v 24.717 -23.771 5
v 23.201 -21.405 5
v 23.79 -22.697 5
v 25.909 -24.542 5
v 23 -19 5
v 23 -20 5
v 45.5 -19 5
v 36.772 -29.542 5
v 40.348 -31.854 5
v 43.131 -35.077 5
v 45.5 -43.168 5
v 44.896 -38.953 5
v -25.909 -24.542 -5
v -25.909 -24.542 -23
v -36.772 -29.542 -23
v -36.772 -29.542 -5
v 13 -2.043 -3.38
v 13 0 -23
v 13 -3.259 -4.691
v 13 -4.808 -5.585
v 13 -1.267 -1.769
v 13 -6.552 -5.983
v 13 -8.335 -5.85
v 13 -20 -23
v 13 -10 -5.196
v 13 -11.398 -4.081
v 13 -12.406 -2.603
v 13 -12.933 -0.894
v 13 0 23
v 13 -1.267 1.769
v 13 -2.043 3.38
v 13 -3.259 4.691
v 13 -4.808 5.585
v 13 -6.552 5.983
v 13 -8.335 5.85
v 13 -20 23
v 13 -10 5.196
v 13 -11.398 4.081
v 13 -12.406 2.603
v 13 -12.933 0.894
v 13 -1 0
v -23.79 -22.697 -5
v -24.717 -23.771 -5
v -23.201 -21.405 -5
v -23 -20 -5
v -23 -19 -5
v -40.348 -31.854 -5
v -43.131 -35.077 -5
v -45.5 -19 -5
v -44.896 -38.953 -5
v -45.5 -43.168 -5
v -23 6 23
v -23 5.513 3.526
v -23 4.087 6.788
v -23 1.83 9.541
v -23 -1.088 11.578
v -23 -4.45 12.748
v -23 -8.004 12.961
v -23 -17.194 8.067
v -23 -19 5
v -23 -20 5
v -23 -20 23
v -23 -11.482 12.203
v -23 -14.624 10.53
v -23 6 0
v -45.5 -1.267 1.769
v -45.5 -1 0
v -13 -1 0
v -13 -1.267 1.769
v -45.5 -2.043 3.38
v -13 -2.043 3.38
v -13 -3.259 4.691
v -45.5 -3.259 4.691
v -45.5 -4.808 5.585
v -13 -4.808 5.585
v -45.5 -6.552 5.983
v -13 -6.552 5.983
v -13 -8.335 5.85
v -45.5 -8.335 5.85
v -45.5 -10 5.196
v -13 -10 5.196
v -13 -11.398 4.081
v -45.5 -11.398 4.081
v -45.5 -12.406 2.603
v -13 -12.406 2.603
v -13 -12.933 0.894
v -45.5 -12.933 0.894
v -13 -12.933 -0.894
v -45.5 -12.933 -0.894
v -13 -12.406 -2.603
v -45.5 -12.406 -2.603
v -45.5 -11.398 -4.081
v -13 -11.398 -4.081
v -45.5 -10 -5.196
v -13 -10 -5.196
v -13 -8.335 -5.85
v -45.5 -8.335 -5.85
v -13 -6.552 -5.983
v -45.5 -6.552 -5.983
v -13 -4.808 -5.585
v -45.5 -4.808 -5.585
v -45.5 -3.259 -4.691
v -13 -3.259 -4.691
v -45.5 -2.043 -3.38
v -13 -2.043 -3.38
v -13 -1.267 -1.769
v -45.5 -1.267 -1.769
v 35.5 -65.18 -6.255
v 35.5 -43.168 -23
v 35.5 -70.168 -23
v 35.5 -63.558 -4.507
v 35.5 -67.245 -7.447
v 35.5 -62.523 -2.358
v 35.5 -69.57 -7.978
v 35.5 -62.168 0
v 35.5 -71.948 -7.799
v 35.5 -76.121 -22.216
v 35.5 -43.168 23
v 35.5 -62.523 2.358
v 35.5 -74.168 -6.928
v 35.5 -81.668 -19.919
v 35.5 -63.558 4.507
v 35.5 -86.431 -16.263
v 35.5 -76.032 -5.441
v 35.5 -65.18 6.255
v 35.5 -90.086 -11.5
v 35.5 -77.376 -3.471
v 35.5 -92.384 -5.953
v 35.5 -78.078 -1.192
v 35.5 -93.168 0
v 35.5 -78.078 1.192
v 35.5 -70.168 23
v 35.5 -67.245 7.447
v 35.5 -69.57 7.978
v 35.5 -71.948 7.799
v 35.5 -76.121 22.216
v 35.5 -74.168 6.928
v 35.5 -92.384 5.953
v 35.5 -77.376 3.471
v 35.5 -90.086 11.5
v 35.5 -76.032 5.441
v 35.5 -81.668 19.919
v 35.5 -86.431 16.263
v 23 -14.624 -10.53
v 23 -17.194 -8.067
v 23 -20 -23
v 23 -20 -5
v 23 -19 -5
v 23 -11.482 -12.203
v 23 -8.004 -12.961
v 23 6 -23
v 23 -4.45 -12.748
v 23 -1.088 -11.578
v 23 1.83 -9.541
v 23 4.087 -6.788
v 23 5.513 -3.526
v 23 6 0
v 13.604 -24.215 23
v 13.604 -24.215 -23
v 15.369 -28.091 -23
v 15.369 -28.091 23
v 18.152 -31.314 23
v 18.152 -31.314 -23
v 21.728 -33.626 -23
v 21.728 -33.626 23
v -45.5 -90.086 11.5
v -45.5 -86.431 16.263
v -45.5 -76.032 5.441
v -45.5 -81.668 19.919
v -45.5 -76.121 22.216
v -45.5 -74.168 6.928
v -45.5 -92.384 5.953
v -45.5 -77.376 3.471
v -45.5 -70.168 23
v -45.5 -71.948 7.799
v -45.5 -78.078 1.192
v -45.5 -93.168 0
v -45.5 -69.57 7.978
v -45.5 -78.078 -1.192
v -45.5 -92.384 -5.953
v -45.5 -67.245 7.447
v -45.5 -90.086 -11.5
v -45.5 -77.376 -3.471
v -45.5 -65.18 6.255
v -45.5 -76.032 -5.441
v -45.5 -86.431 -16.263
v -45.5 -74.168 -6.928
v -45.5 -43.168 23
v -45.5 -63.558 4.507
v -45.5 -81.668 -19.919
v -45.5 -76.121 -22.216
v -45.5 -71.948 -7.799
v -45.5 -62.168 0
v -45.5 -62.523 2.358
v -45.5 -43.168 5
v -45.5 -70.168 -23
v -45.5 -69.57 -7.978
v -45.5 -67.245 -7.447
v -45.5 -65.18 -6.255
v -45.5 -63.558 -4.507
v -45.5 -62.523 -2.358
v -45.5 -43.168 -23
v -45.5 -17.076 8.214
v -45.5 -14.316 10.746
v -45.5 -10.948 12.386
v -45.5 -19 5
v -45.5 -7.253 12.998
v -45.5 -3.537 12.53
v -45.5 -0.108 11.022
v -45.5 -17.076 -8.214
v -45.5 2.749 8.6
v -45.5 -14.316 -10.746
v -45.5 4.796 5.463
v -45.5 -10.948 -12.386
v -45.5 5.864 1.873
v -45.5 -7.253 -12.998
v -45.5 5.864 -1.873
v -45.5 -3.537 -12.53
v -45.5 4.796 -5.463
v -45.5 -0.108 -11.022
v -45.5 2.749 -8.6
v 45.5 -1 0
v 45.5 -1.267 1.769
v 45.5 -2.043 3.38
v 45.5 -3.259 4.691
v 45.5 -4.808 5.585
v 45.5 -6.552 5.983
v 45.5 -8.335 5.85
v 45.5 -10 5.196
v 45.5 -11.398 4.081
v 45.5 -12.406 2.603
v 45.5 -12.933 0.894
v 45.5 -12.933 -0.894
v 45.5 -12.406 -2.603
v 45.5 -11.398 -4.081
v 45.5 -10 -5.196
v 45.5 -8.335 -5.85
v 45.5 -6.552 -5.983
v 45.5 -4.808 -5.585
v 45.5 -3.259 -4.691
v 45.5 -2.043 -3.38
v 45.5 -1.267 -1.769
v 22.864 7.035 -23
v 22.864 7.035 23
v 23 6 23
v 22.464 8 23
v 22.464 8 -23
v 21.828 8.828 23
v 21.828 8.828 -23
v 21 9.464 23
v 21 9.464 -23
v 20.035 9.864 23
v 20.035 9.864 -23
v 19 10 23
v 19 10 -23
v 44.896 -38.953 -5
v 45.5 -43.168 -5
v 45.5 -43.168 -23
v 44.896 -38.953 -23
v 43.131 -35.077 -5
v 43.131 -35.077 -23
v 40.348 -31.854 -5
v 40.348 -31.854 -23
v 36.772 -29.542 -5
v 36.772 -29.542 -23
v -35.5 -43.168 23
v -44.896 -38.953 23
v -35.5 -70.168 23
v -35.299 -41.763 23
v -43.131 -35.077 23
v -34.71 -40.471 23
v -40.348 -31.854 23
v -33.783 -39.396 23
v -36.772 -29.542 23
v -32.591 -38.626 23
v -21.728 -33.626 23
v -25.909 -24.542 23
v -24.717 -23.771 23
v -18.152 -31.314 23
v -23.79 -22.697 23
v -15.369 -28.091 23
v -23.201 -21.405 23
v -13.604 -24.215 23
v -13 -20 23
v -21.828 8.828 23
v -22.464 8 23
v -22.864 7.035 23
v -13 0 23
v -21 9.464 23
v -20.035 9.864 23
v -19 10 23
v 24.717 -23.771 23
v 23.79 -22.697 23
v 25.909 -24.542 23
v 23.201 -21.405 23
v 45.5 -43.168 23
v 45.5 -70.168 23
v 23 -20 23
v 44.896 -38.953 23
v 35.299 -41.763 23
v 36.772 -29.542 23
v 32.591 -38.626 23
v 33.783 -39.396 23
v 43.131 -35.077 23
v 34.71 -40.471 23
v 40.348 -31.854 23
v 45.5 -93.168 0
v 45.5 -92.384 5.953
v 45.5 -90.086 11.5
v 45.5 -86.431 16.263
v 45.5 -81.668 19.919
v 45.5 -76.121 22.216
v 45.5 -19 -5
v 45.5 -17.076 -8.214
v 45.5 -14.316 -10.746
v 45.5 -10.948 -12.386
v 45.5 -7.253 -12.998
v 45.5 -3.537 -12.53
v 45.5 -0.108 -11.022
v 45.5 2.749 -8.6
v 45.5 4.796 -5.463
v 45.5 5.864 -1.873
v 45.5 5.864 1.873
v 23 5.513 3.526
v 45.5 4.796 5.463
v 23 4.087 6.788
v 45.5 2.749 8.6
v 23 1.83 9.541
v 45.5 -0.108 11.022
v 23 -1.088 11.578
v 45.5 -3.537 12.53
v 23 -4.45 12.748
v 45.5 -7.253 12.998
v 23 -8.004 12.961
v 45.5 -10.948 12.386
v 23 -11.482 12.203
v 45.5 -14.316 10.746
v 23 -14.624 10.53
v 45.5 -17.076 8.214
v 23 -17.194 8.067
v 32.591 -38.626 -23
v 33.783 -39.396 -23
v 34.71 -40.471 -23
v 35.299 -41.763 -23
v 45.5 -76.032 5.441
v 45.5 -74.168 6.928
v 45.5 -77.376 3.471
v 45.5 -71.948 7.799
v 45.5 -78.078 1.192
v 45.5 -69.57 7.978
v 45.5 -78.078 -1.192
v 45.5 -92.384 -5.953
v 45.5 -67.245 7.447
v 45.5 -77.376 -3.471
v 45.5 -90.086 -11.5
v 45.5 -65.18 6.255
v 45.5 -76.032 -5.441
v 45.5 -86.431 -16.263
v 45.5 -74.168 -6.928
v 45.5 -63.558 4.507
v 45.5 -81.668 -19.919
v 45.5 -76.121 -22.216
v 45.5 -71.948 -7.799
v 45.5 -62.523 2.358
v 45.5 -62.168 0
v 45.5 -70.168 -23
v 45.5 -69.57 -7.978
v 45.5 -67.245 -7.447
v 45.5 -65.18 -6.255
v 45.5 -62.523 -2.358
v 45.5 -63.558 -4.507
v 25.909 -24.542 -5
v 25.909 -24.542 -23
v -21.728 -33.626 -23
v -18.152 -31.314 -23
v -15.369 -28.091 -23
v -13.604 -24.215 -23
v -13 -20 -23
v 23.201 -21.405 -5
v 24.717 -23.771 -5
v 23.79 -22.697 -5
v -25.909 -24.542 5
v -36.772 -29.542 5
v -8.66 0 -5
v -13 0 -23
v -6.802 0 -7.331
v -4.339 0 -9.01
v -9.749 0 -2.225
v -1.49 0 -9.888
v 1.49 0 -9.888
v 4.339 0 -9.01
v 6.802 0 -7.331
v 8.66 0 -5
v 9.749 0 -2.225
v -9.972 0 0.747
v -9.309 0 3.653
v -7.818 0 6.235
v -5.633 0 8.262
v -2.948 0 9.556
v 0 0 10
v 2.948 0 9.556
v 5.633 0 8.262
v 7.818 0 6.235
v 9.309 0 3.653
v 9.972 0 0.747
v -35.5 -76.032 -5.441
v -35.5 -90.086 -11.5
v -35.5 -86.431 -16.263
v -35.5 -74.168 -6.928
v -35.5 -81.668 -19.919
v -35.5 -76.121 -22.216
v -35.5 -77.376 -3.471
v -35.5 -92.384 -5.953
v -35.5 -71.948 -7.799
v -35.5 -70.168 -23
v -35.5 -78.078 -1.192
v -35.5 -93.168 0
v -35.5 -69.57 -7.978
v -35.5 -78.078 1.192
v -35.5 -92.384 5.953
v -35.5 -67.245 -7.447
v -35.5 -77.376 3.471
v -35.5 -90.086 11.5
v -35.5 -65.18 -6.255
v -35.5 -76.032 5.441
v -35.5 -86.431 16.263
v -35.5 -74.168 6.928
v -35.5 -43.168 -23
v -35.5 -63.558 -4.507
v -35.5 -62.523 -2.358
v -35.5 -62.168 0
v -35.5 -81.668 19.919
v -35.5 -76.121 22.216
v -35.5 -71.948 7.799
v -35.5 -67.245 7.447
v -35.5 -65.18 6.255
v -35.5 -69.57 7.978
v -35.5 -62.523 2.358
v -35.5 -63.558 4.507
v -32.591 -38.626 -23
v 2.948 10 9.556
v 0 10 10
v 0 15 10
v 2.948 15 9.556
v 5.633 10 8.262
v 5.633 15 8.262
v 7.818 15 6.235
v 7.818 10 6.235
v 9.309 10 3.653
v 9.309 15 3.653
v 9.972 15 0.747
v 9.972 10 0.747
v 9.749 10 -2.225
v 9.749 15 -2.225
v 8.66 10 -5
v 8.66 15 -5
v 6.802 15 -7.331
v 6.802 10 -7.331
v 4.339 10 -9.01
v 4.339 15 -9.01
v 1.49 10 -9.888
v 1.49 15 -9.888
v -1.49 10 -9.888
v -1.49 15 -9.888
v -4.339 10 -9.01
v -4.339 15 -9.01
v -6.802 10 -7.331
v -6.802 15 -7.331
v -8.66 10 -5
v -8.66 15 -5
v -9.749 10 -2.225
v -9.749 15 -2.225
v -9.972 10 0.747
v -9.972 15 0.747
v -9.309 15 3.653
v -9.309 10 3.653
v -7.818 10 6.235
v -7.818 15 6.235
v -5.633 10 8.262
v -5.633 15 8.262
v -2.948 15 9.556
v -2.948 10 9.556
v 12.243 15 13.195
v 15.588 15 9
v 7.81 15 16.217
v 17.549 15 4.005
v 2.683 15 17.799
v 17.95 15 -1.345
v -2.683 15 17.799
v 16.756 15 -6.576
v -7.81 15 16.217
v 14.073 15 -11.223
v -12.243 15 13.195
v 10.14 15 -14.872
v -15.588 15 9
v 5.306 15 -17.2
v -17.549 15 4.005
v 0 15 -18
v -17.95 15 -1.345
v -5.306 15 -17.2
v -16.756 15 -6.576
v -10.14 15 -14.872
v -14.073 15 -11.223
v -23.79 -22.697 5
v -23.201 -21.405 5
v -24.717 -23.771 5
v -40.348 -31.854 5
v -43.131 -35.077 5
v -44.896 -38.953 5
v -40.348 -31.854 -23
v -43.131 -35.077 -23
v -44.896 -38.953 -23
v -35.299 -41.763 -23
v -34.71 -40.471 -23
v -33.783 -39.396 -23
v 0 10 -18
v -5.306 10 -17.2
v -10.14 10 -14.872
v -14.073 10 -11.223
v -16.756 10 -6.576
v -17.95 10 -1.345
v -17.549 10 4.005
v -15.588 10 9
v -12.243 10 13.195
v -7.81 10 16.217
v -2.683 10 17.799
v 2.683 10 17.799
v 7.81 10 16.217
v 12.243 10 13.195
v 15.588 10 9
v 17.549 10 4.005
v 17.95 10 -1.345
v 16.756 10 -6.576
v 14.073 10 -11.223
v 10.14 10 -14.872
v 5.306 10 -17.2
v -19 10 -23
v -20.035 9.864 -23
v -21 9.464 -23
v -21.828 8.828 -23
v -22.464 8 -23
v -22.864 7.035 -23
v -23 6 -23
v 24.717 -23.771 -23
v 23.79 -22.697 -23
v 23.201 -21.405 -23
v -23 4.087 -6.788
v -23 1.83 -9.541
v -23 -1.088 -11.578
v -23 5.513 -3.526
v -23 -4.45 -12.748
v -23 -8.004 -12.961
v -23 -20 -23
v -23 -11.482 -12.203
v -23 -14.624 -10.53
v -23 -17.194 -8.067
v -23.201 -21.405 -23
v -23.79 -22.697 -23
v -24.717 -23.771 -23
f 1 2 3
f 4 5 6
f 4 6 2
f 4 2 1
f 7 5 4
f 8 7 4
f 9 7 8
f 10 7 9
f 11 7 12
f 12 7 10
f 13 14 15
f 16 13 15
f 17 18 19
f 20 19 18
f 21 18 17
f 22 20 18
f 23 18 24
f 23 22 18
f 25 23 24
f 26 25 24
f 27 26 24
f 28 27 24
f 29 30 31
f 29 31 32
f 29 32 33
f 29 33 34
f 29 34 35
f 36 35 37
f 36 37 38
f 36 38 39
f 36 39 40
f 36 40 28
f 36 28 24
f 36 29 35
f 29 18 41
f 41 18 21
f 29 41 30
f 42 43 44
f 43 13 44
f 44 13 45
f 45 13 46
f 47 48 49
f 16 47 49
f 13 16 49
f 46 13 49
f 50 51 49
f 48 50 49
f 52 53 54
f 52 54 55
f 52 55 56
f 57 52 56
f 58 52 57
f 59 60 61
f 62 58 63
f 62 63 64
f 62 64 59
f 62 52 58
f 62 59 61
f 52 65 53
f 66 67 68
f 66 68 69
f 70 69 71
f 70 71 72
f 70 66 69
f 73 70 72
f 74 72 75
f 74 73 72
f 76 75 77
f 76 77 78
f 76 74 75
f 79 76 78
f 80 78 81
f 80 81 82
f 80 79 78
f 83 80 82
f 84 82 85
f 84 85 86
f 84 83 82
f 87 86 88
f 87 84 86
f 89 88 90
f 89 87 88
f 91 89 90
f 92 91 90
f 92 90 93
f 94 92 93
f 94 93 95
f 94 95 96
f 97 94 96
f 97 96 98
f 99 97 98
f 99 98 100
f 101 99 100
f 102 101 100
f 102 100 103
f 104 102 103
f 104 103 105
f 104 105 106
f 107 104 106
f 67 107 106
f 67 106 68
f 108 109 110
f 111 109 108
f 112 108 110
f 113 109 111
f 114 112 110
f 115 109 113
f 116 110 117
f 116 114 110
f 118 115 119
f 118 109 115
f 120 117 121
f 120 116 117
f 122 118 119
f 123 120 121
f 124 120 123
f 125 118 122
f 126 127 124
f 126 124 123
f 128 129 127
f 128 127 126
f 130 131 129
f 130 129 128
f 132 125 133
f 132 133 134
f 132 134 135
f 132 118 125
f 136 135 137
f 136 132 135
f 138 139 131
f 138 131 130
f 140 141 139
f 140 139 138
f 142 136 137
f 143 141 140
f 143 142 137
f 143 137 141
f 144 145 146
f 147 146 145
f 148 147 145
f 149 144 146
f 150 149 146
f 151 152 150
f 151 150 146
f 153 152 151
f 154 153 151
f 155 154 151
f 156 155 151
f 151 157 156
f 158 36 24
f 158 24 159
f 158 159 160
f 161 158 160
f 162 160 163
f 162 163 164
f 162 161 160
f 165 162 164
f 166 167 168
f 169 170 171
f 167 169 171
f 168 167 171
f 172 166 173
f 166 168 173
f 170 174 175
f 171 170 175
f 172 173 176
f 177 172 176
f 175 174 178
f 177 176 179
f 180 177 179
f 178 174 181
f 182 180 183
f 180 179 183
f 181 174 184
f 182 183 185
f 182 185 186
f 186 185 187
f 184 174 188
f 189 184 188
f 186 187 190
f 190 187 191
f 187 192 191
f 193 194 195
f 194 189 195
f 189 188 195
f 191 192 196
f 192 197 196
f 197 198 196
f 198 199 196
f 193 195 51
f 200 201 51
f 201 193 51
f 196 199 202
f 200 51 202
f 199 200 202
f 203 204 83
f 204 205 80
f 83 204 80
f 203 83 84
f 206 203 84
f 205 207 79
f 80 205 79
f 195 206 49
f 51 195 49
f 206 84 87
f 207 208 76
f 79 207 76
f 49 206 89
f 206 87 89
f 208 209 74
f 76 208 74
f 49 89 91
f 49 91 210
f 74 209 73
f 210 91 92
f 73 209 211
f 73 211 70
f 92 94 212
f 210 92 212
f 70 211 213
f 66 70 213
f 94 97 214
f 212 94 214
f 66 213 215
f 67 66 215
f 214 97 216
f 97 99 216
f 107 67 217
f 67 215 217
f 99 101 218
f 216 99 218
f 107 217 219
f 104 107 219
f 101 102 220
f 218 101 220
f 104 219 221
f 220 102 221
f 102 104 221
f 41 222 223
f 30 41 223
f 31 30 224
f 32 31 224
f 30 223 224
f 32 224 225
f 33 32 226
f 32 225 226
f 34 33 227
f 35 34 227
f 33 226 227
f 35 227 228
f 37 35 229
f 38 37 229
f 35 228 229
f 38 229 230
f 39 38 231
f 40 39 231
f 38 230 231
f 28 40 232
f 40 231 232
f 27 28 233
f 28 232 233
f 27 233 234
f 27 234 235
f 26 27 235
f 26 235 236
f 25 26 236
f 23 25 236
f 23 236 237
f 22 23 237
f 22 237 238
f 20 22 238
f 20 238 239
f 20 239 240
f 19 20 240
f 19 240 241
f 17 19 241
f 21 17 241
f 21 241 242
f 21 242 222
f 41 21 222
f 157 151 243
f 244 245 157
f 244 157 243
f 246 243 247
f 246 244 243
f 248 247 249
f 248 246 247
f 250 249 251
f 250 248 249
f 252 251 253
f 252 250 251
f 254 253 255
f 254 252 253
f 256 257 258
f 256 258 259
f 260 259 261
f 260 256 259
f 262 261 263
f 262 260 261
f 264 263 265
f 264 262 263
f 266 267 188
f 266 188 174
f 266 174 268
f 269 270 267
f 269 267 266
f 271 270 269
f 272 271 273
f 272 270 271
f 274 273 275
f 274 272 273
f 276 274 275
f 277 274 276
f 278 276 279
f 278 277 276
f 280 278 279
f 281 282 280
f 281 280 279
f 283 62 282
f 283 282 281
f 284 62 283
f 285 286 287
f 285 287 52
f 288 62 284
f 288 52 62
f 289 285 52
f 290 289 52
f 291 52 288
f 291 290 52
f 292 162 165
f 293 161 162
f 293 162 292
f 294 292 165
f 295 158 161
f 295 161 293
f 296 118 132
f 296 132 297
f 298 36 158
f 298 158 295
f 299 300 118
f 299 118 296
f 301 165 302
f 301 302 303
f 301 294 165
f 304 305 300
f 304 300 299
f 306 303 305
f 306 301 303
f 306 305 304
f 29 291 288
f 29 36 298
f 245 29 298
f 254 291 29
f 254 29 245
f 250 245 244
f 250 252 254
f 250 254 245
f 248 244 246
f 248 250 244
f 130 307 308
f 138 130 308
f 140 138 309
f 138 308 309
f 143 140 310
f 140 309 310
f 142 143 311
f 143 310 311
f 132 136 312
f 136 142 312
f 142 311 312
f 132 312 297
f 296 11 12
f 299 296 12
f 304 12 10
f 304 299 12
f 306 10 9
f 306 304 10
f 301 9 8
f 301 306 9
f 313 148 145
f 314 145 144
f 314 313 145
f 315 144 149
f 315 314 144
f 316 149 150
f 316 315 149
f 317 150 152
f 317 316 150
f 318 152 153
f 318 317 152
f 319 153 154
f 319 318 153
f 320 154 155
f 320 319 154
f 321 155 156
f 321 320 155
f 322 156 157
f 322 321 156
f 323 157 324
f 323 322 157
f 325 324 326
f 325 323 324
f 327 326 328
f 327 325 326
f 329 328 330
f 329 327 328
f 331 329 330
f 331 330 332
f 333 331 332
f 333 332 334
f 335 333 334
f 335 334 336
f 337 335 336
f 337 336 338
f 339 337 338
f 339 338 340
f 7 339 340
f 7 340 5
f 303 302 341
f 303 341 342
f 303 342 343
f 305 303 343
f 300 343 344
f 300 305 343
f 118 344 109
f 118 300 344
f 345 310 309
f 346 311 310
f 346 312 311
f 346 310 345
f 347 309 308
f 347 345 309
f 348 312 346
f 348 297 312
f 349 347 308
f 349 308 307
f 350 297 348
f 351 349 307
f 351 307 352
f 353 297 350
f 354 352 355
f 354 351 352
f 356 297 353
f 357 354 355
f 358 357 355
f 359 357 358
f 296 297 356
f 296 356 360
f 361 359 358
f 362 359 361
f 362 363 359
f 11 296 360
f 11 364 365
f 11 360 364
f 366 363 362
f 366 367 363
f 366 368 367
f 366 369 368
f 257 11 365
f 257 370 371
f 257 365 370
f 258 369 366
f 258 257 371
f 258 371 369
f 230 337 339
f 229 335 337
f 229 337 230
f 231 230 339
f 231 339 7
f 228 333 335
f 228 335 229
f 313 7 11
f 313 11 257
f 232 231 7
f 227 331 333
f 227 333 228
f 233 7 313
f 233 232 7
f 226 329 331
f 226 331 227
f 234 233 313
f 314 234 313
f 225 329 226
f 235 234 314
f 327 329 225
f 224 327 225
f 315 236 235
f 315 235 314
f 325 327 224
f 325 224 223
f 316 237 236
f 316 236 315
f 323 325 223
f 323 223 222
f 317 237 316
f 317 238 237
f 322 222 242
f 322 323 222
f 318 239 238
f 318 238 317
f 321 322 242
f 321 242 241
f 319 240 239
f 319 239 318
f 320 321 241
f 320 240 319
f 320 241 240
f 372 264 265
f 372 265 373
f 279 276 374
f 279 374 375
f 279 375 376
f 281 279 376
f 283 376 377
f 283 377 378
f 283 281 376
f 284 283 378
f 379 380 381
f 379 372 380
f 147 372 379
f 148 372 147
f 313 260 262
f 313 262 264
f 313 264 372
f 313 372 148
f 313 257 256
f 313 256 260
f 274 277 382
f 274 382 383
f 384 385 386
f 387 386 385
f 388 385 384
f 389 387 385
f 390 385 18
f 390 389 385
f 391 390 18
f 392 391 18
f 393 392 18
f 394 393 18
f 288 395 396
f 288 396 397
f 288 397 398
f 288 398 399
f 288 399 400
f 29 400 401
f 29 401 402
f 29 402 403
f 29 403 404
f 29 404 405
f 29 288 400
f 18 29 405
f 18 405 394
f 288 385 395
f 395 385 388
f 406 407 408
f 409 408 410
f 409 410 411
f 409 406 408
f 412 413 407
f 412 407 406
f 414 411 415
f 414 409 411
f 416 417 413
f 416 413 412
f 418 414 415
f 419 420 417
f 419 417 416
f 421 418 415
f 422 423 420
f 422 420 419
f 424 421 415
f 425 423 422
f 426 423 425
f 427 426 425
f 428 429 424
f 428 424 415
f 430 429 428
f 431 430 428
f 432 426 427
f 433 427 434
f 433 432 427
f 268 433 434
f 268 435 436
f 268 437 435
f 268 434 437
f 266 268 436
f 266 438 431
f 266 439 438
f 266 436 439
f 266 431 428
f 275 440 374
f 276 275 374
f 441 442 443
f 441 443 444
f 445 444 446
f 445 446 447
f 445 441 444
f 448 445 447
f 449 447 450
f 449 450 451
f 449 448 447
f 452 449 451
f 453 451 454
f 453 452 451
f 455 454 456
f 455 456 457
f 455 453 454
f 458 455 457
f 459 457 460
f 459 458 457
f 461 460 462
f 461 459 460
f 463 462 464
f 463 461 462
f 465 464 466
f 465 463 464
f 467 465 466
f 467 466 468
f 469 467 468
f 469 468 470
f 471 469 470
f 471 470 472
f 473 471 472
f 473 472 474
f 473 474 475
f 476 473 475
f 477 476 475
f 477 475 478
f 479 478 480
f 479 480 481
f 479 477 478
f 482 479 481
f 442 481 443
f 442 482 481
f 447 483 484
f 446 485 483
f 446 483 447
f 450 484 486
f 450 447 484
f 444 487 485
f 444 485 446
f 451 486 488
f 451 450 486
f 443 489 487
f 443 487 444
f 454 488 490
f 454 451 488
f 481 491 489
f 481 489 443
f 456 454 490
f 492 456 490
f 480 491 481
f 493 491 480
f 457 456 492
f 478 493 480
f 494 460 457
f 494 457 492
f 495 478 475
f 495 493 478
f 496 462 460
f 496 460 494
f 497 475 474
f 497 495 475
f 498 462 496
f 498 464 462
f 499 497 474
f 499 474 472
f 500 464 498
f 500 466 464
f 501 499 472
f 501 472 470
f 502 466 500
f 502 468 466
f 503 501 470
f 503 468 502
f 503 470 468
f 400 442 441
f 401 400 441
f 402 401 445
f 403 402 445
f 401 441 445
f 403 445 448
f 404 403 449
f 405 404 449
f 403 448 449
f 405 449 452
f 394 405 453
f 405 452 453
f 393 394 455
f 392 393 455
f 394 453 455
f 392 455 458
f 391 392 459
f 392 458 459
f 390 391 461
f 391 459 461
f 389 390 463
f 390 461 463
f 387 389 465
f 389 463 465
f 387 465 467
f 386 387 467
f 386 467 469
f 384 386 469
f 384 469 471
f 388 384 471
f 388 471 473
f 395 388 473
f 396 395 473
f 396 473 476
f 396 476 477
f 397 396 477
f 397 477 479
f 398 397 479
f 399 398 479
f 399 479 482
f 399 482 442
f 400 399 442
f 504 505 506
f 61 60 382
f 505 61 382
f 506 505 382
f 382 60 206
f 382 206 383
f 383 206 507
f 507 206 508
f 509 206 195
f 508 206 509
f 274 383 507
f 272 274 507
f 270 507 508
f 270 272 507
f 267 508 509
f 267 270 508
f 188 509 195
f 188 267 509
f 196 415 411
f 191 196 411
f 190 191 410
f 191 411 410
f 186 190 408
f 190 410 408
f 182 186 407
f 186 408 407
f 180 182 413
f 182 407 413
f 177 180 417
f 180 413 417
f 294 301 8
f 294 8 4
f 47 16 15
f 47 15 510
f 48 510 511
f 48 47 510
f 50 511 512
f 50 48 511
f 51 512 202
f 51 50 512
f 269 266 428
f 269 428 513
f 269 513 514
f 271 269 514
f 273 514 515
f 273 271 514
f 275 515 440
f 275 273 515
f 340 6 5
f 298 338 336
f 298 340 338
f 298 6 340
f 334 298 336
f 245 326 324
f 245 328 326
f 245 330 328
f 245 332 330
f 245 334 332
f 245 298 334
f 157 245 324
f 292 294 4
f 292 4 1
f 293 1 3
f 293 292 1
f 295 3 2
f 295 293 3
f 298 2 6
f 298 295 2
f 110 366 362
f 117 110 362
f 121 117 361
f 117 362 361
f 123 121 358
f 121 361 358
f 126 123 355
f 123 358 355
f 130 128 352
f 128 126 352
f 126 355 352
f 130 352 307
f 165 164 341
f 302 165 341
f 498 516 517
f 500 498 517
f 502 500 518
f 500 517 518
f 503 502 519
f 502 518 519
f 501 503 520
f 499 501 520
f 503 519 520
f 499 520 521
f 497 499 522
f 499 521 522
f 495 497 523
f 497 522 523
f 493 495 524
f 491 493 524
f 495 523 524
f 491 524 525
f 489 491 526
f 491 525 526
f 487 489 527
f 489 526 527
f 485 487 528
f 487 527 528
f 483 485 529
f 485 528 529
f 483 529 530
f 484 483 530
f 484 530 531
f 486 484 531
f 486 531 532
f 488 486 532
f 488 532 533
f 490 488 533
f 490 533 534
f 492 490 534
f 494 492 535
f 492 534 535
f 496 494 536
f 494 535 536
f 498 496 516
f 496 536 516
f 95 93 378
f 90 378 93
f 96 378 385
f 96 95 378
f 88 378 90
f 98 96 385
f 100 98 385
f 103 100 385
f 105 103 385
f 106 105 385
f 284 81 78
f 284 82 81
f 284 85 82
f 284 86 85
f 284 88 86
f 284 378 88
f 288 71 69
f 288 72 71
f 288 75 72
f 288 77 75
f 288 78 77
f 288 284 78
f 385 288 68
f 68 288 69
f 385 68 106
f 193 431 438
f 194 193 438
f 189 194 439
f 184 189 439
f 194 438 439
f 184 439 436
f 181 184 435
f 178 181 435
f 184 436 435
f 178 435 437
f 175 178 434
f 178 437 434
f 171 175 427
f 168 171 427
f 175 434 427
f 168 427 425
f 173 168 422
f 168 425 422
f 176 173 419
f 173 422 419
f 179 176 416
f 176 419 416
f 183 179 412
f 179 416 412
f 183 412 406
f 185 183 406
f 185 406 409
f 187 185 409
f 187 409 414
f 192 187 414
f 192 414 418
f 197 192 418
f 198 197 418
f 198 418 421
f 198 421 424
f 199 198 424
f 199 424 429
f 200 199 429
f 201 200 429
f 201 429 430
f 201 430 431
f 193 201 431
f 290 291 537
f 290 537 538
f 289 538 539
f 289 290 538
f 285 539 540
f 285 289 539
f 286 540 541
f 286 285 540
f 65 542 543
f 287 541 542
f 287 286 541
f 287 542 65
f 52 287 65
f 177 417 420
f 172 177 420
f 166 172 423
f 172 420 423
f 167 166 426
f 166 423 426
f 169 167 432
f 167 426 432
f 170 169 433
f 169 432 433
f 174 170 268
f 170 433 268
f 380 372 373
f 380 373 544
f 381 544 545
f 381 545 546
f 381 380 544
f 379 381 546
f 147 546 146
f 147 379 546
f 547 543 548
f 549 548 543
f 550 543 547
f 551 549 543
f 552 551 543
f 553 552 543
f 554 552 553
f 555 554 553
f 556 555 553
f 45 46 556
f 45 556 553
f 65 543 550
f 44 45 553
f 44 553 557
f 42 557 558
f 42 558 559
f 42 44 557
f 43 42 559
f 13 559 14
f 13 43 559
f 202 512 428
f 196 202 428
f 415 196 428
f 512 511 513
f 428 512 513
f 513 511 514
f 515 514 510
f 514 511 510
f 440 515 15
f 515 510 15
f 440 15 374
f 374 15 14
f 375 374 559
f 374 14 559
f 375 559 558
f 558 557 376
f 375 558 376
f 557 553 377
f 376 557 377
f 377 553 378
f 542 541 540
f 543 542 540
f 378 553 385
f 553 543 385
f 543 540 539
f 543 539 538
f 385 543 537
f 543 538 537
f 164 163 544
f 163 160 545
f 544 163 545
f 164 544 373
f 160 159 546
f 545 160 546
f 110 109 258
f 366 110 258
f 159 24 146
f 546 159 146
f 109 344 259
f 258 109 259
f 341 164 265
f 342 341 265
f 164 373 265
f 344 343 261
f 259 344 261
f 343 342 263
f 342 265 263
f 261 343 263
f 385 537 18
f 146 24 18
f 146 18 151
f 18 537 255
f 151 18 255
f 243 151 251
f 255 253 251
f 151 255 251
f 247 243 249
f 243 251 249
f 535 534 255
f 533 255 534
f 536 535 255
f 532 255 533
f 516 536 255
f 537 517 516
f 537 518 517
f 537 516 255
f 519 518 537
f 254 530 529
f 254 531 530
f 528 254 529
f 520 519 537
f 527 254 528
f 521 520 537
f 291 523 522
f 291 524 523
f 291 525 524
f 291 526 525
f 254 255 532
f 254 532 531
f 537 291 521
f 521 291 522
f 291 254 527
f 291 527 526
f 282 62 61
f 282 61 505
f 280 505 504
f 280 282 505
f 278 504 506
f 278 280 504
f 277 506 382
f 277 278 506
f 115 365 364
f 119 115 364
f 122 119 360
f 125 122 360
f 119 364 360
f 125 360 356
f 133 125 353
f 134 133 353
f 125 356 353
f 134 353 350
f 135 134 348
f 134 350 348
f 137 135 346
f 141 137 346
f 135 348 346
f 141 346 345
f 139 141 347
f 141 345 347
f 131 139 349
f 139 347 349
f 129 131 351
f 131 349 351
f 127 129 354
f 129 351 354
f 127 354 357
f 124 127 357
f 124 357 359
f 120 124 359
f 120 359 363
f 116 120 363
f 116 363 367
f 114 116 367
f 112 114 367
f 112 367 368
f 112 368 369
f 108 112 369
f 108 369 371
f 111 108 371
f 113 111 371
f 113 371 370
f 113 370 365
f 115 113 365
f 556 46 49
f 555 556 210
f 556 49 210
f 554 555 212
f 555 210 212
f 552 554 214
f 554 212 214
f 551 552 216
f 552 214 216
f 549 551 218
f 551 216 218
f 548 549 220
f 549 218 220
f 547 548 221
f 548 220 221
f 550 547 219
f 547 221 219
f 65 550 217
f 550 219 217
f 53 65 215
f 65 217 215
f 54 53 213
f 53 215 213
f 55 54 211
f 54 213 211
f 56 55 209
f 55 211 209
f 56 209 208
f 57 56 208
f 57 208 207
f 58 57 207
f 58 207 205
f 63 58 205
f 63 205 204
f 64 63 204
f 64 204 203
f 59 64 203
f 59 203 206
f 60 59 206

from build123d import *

# Parameters (mm, degrees)
BOSS_EXTRUDE1_DEPTH = 23
SKETCH2_R           = 8
CUT_EXTRUDE1_DEPTH  = 133.250640603
SKETCH3_R           = 18
SKETCH3_R_2         = 10
BOSS_EXTRUDE2_DEPTH = 5
CUT_EXTRUDE2_REACH  = 117.078
SKETCH4_R           = 10
BOSS_EXTRUDE3_REACH = 134.251
SKETCH5_R           = 6
CUT_EXTRUDE4_REACH  = 119.905
SKETCH7_R           = 6


with BuildPart() as part:
    # Sketch1 → Boss-Extrude1 (new, symmetric)
    with BuildSketch(Plane.XY):
        with BuildLine():
            Line((0, 0), (13, 0))
            Line((13, 0), (13, -20))
            ThreePointArc((13, -20), (15.369109272, -28.090772486), (21.728079924, -33.625821757))
            Line((21.728079924, -33.625821757), (32.590640025, -38.625821757))
            ThreePointArc((32.590640025, -38.625821757), (34.710296909, -40.470838181), (35.5, -43.167762343))
            Line((35.5, -43.167762343), (35.5, -93.167762343))
            Line((35.5, -93.167762343), (45.5, -93.167762343))
            Line((45.5, -93.167762343), (45.5, -43.167762343))
            ThreePointArc((45.5, -43.167762343), (43.130890728, -35.076989856), (36.771920076, -29.541940586))
            Line((36.771920076, -29.541940586), (25.909359975, -24.541940586))
            ThreePointArc((25.909359975, -24.541940586), (23.789703091, -22.696924162), (23, -20))
            Line((23, -20), (23, 6))
            ThreePointArc((23, 6), (21.828427125, 8.828427125), (19, 10))
            Line((19, 10), (-19, 10))
            ThreePointArc((-19, 10), (-21.828427125, 8.828427125), (-23, 6))
            Line((-23, 6), (-23, -20))
            ThreePointArc((-23, -20), (-23.789703091, -22.696924162), (-25.909359975, -24.541940586))
            Line((-25.909359975, -24.541940586), (-36.771920076, -29.541940586))
            ThreePointArc((-36.771920076, -29.541940586), (-43.130890728, -35.076989856), (-45.5, -43.167762343))
            Line((-45.5, -43.167762343), (-45.5, -93.167762343))
            Line((-45.5, -93.167762343), (-35.5, -93.167762343))
            Line((-35.5, -93.167762343), (-35.5, -43.167762343))
            ThreePointArc((-35.5, -43.167762343), (-34.710296909, -40.470838181), (-32.590640025, -38.625821757))
            Line((-32.590640025, -38.625821757), (-21.728079924, -33.625821757))
            ThreePointArc((-21.728079924, -33.625821757), (-15.369109272, -28.090772486), (-13, -20))
            Line((-13, -20), (-13, 0))
            Line((-13, 0), (0, 0))
        make_face()
    extrude(amount=BOSS_EXTRUDE1_DEPTH, both=True)

    # Sketch2 → Cut-Extrude1 (cut, through all)
    with BuildSketch(Plane(origin=(45.5, 0, 0), x_dir=(0, 0, -1), z_dir=(1, 0, 0))):
        with Locations(Location((0, -70.167762343, 0), (0, 0, 90))):
            Circle(SKETCH2_R)
        with BuildLine():
            ThreePointArc((0, -93.167762343), (-16.263455967, -86.43121831), (-23, -70.167762343))
            Line((-23, -70.167762343), (-23, -93.167762343))
            Line((-23, -93.167762343), (0, -93.167762343))
        make_face()
        with BuildLine():
            ThreePointArc((23, -70.167762343), (16.263455967, -86.43121831), (0, -93.167762343))
            Line((0, -93.167762343), (23, -93.167762343))
            Line((23, -93.167762343), (23, -70.167762343))
        make_face()
    extrude(amount=-CUT_EXTRUDE1_DEPTH, mode=Mode.SUBTRACT)

    # Sketch3 → Boss-Extrude2 (add)
    with BuildSketch(Plane(origin=(0, 10, 0), x_dir=(1, 0, 0), z_dir=(0, 1, 0))):
        with Locations(Location((0, 0, 0), (0, 0, 90))):
            Circle(SKETCH3_R)
        with Locations(Location((0, 0, 0), (0, 0, 270))):
            Circle(SKETCH3_R_2, mode=Mode.SUBTRACT)
    extrude(amount=BOSS_EXTRUDE2_DEPTH)

    # Sketch4 → Cut-Extrude2 (cut, up to next)
    with BuildSketch(Plane(origin=(0, 10, 0), x_dir=(1, 0, 0), z_dir=(0, 1, 0)), mode=Mode.PRIVATE) as cut_extrude2_sk1:
        with Locations(Location((0, 0, 0), (0, 0, 270))):
            Circle(SKETCH4_R)
    cut_extrude2_tool1 = extrude(cut_extrude2_sk1.sketch, amount=-CUT_EXTRUDE2_REACH, mode=Mode.PRIVATE) & part.part
    add(cut_extrude2_tool1.solids().sort_by_distance((0, 10, 0))[0], mode=Mode.SUBTRACT)

    # Sketch5 → Boss-Extrude3 (add, up to next)
    with BuildSketch(Plane(origin=(45.5, 0, 0), x_dir=(0, 0, -1), z_dir=(1, 0, 0)), mode=Mode.PRIVATE) as boss_extrude3_sk1:
        with BuildLine():
            Line((5, -60.379262018), (5, -19))
            ThreePointArc((5, -19), (0, 6), (-5, -19))
            Line((-5, -19), (-5, -60.379262018))
            Line((-5, -60.379262018), (5, -60.379262018))
        make_face()
        with Locations(Location((0, -7, 0), (0, 0, 90))):
            Circle(SKETCH5_R, mode=Mode.SUBTRACT)
    boss_extrude3_tool1 = extrude(boss_extrude3_sk1.sketch, amount=-BOSS_EXTRUDE3_REACH, mode=Mode.PRIVATE) - part.part
    boss_extrude3 = boss_extrude3_tool1.solids().sort_by_distance((45.5, -23.296906, 0))[0]
    add(boss_extrude3)

    # Sketch7 → Cut-Extrude4 (cut, up to next)
    with BuildSketch(Plane(origin=(23, 0, 0), x_dir=(0, 0, -1), z_dir=(1, 0, 0)), mode=Mode.PRIVATE) as cut_extrude4_sk1:
        with Locations(Location((0, -7, 0), (0, 0, 90))):
            Circle(SKETCH7_R)
    cut_extrude4_tool1 = extrude(cut_extrude4_sk1.sketch, amount=-CUT_EXTRUDE4_REACH, mode=Mode.PRIVATE) & part.part
    cut_extrude4 = cut_extrude4_tool1.solids().sort_by_distance((23, -7, 0))[0]
    add(cut_extrude4, mode=Mode.SUBTRACT)

    # Mirror1: Boss-Extrude3, Cut-Extrude4 across plane
    add(boss_extrude3.mirror(Plane(origin=(0, 0, 0), x_dir=(0, 0, 1), z_dir=(1, 0, 0))))
    add(cut_extrude4.mirror(Plane(origin=(0, 0, 0), x_dir=(0, 0, 1), z_dir=(1, 0, 0))), mode=Mode.SUBTRACT)


solid = part.part
